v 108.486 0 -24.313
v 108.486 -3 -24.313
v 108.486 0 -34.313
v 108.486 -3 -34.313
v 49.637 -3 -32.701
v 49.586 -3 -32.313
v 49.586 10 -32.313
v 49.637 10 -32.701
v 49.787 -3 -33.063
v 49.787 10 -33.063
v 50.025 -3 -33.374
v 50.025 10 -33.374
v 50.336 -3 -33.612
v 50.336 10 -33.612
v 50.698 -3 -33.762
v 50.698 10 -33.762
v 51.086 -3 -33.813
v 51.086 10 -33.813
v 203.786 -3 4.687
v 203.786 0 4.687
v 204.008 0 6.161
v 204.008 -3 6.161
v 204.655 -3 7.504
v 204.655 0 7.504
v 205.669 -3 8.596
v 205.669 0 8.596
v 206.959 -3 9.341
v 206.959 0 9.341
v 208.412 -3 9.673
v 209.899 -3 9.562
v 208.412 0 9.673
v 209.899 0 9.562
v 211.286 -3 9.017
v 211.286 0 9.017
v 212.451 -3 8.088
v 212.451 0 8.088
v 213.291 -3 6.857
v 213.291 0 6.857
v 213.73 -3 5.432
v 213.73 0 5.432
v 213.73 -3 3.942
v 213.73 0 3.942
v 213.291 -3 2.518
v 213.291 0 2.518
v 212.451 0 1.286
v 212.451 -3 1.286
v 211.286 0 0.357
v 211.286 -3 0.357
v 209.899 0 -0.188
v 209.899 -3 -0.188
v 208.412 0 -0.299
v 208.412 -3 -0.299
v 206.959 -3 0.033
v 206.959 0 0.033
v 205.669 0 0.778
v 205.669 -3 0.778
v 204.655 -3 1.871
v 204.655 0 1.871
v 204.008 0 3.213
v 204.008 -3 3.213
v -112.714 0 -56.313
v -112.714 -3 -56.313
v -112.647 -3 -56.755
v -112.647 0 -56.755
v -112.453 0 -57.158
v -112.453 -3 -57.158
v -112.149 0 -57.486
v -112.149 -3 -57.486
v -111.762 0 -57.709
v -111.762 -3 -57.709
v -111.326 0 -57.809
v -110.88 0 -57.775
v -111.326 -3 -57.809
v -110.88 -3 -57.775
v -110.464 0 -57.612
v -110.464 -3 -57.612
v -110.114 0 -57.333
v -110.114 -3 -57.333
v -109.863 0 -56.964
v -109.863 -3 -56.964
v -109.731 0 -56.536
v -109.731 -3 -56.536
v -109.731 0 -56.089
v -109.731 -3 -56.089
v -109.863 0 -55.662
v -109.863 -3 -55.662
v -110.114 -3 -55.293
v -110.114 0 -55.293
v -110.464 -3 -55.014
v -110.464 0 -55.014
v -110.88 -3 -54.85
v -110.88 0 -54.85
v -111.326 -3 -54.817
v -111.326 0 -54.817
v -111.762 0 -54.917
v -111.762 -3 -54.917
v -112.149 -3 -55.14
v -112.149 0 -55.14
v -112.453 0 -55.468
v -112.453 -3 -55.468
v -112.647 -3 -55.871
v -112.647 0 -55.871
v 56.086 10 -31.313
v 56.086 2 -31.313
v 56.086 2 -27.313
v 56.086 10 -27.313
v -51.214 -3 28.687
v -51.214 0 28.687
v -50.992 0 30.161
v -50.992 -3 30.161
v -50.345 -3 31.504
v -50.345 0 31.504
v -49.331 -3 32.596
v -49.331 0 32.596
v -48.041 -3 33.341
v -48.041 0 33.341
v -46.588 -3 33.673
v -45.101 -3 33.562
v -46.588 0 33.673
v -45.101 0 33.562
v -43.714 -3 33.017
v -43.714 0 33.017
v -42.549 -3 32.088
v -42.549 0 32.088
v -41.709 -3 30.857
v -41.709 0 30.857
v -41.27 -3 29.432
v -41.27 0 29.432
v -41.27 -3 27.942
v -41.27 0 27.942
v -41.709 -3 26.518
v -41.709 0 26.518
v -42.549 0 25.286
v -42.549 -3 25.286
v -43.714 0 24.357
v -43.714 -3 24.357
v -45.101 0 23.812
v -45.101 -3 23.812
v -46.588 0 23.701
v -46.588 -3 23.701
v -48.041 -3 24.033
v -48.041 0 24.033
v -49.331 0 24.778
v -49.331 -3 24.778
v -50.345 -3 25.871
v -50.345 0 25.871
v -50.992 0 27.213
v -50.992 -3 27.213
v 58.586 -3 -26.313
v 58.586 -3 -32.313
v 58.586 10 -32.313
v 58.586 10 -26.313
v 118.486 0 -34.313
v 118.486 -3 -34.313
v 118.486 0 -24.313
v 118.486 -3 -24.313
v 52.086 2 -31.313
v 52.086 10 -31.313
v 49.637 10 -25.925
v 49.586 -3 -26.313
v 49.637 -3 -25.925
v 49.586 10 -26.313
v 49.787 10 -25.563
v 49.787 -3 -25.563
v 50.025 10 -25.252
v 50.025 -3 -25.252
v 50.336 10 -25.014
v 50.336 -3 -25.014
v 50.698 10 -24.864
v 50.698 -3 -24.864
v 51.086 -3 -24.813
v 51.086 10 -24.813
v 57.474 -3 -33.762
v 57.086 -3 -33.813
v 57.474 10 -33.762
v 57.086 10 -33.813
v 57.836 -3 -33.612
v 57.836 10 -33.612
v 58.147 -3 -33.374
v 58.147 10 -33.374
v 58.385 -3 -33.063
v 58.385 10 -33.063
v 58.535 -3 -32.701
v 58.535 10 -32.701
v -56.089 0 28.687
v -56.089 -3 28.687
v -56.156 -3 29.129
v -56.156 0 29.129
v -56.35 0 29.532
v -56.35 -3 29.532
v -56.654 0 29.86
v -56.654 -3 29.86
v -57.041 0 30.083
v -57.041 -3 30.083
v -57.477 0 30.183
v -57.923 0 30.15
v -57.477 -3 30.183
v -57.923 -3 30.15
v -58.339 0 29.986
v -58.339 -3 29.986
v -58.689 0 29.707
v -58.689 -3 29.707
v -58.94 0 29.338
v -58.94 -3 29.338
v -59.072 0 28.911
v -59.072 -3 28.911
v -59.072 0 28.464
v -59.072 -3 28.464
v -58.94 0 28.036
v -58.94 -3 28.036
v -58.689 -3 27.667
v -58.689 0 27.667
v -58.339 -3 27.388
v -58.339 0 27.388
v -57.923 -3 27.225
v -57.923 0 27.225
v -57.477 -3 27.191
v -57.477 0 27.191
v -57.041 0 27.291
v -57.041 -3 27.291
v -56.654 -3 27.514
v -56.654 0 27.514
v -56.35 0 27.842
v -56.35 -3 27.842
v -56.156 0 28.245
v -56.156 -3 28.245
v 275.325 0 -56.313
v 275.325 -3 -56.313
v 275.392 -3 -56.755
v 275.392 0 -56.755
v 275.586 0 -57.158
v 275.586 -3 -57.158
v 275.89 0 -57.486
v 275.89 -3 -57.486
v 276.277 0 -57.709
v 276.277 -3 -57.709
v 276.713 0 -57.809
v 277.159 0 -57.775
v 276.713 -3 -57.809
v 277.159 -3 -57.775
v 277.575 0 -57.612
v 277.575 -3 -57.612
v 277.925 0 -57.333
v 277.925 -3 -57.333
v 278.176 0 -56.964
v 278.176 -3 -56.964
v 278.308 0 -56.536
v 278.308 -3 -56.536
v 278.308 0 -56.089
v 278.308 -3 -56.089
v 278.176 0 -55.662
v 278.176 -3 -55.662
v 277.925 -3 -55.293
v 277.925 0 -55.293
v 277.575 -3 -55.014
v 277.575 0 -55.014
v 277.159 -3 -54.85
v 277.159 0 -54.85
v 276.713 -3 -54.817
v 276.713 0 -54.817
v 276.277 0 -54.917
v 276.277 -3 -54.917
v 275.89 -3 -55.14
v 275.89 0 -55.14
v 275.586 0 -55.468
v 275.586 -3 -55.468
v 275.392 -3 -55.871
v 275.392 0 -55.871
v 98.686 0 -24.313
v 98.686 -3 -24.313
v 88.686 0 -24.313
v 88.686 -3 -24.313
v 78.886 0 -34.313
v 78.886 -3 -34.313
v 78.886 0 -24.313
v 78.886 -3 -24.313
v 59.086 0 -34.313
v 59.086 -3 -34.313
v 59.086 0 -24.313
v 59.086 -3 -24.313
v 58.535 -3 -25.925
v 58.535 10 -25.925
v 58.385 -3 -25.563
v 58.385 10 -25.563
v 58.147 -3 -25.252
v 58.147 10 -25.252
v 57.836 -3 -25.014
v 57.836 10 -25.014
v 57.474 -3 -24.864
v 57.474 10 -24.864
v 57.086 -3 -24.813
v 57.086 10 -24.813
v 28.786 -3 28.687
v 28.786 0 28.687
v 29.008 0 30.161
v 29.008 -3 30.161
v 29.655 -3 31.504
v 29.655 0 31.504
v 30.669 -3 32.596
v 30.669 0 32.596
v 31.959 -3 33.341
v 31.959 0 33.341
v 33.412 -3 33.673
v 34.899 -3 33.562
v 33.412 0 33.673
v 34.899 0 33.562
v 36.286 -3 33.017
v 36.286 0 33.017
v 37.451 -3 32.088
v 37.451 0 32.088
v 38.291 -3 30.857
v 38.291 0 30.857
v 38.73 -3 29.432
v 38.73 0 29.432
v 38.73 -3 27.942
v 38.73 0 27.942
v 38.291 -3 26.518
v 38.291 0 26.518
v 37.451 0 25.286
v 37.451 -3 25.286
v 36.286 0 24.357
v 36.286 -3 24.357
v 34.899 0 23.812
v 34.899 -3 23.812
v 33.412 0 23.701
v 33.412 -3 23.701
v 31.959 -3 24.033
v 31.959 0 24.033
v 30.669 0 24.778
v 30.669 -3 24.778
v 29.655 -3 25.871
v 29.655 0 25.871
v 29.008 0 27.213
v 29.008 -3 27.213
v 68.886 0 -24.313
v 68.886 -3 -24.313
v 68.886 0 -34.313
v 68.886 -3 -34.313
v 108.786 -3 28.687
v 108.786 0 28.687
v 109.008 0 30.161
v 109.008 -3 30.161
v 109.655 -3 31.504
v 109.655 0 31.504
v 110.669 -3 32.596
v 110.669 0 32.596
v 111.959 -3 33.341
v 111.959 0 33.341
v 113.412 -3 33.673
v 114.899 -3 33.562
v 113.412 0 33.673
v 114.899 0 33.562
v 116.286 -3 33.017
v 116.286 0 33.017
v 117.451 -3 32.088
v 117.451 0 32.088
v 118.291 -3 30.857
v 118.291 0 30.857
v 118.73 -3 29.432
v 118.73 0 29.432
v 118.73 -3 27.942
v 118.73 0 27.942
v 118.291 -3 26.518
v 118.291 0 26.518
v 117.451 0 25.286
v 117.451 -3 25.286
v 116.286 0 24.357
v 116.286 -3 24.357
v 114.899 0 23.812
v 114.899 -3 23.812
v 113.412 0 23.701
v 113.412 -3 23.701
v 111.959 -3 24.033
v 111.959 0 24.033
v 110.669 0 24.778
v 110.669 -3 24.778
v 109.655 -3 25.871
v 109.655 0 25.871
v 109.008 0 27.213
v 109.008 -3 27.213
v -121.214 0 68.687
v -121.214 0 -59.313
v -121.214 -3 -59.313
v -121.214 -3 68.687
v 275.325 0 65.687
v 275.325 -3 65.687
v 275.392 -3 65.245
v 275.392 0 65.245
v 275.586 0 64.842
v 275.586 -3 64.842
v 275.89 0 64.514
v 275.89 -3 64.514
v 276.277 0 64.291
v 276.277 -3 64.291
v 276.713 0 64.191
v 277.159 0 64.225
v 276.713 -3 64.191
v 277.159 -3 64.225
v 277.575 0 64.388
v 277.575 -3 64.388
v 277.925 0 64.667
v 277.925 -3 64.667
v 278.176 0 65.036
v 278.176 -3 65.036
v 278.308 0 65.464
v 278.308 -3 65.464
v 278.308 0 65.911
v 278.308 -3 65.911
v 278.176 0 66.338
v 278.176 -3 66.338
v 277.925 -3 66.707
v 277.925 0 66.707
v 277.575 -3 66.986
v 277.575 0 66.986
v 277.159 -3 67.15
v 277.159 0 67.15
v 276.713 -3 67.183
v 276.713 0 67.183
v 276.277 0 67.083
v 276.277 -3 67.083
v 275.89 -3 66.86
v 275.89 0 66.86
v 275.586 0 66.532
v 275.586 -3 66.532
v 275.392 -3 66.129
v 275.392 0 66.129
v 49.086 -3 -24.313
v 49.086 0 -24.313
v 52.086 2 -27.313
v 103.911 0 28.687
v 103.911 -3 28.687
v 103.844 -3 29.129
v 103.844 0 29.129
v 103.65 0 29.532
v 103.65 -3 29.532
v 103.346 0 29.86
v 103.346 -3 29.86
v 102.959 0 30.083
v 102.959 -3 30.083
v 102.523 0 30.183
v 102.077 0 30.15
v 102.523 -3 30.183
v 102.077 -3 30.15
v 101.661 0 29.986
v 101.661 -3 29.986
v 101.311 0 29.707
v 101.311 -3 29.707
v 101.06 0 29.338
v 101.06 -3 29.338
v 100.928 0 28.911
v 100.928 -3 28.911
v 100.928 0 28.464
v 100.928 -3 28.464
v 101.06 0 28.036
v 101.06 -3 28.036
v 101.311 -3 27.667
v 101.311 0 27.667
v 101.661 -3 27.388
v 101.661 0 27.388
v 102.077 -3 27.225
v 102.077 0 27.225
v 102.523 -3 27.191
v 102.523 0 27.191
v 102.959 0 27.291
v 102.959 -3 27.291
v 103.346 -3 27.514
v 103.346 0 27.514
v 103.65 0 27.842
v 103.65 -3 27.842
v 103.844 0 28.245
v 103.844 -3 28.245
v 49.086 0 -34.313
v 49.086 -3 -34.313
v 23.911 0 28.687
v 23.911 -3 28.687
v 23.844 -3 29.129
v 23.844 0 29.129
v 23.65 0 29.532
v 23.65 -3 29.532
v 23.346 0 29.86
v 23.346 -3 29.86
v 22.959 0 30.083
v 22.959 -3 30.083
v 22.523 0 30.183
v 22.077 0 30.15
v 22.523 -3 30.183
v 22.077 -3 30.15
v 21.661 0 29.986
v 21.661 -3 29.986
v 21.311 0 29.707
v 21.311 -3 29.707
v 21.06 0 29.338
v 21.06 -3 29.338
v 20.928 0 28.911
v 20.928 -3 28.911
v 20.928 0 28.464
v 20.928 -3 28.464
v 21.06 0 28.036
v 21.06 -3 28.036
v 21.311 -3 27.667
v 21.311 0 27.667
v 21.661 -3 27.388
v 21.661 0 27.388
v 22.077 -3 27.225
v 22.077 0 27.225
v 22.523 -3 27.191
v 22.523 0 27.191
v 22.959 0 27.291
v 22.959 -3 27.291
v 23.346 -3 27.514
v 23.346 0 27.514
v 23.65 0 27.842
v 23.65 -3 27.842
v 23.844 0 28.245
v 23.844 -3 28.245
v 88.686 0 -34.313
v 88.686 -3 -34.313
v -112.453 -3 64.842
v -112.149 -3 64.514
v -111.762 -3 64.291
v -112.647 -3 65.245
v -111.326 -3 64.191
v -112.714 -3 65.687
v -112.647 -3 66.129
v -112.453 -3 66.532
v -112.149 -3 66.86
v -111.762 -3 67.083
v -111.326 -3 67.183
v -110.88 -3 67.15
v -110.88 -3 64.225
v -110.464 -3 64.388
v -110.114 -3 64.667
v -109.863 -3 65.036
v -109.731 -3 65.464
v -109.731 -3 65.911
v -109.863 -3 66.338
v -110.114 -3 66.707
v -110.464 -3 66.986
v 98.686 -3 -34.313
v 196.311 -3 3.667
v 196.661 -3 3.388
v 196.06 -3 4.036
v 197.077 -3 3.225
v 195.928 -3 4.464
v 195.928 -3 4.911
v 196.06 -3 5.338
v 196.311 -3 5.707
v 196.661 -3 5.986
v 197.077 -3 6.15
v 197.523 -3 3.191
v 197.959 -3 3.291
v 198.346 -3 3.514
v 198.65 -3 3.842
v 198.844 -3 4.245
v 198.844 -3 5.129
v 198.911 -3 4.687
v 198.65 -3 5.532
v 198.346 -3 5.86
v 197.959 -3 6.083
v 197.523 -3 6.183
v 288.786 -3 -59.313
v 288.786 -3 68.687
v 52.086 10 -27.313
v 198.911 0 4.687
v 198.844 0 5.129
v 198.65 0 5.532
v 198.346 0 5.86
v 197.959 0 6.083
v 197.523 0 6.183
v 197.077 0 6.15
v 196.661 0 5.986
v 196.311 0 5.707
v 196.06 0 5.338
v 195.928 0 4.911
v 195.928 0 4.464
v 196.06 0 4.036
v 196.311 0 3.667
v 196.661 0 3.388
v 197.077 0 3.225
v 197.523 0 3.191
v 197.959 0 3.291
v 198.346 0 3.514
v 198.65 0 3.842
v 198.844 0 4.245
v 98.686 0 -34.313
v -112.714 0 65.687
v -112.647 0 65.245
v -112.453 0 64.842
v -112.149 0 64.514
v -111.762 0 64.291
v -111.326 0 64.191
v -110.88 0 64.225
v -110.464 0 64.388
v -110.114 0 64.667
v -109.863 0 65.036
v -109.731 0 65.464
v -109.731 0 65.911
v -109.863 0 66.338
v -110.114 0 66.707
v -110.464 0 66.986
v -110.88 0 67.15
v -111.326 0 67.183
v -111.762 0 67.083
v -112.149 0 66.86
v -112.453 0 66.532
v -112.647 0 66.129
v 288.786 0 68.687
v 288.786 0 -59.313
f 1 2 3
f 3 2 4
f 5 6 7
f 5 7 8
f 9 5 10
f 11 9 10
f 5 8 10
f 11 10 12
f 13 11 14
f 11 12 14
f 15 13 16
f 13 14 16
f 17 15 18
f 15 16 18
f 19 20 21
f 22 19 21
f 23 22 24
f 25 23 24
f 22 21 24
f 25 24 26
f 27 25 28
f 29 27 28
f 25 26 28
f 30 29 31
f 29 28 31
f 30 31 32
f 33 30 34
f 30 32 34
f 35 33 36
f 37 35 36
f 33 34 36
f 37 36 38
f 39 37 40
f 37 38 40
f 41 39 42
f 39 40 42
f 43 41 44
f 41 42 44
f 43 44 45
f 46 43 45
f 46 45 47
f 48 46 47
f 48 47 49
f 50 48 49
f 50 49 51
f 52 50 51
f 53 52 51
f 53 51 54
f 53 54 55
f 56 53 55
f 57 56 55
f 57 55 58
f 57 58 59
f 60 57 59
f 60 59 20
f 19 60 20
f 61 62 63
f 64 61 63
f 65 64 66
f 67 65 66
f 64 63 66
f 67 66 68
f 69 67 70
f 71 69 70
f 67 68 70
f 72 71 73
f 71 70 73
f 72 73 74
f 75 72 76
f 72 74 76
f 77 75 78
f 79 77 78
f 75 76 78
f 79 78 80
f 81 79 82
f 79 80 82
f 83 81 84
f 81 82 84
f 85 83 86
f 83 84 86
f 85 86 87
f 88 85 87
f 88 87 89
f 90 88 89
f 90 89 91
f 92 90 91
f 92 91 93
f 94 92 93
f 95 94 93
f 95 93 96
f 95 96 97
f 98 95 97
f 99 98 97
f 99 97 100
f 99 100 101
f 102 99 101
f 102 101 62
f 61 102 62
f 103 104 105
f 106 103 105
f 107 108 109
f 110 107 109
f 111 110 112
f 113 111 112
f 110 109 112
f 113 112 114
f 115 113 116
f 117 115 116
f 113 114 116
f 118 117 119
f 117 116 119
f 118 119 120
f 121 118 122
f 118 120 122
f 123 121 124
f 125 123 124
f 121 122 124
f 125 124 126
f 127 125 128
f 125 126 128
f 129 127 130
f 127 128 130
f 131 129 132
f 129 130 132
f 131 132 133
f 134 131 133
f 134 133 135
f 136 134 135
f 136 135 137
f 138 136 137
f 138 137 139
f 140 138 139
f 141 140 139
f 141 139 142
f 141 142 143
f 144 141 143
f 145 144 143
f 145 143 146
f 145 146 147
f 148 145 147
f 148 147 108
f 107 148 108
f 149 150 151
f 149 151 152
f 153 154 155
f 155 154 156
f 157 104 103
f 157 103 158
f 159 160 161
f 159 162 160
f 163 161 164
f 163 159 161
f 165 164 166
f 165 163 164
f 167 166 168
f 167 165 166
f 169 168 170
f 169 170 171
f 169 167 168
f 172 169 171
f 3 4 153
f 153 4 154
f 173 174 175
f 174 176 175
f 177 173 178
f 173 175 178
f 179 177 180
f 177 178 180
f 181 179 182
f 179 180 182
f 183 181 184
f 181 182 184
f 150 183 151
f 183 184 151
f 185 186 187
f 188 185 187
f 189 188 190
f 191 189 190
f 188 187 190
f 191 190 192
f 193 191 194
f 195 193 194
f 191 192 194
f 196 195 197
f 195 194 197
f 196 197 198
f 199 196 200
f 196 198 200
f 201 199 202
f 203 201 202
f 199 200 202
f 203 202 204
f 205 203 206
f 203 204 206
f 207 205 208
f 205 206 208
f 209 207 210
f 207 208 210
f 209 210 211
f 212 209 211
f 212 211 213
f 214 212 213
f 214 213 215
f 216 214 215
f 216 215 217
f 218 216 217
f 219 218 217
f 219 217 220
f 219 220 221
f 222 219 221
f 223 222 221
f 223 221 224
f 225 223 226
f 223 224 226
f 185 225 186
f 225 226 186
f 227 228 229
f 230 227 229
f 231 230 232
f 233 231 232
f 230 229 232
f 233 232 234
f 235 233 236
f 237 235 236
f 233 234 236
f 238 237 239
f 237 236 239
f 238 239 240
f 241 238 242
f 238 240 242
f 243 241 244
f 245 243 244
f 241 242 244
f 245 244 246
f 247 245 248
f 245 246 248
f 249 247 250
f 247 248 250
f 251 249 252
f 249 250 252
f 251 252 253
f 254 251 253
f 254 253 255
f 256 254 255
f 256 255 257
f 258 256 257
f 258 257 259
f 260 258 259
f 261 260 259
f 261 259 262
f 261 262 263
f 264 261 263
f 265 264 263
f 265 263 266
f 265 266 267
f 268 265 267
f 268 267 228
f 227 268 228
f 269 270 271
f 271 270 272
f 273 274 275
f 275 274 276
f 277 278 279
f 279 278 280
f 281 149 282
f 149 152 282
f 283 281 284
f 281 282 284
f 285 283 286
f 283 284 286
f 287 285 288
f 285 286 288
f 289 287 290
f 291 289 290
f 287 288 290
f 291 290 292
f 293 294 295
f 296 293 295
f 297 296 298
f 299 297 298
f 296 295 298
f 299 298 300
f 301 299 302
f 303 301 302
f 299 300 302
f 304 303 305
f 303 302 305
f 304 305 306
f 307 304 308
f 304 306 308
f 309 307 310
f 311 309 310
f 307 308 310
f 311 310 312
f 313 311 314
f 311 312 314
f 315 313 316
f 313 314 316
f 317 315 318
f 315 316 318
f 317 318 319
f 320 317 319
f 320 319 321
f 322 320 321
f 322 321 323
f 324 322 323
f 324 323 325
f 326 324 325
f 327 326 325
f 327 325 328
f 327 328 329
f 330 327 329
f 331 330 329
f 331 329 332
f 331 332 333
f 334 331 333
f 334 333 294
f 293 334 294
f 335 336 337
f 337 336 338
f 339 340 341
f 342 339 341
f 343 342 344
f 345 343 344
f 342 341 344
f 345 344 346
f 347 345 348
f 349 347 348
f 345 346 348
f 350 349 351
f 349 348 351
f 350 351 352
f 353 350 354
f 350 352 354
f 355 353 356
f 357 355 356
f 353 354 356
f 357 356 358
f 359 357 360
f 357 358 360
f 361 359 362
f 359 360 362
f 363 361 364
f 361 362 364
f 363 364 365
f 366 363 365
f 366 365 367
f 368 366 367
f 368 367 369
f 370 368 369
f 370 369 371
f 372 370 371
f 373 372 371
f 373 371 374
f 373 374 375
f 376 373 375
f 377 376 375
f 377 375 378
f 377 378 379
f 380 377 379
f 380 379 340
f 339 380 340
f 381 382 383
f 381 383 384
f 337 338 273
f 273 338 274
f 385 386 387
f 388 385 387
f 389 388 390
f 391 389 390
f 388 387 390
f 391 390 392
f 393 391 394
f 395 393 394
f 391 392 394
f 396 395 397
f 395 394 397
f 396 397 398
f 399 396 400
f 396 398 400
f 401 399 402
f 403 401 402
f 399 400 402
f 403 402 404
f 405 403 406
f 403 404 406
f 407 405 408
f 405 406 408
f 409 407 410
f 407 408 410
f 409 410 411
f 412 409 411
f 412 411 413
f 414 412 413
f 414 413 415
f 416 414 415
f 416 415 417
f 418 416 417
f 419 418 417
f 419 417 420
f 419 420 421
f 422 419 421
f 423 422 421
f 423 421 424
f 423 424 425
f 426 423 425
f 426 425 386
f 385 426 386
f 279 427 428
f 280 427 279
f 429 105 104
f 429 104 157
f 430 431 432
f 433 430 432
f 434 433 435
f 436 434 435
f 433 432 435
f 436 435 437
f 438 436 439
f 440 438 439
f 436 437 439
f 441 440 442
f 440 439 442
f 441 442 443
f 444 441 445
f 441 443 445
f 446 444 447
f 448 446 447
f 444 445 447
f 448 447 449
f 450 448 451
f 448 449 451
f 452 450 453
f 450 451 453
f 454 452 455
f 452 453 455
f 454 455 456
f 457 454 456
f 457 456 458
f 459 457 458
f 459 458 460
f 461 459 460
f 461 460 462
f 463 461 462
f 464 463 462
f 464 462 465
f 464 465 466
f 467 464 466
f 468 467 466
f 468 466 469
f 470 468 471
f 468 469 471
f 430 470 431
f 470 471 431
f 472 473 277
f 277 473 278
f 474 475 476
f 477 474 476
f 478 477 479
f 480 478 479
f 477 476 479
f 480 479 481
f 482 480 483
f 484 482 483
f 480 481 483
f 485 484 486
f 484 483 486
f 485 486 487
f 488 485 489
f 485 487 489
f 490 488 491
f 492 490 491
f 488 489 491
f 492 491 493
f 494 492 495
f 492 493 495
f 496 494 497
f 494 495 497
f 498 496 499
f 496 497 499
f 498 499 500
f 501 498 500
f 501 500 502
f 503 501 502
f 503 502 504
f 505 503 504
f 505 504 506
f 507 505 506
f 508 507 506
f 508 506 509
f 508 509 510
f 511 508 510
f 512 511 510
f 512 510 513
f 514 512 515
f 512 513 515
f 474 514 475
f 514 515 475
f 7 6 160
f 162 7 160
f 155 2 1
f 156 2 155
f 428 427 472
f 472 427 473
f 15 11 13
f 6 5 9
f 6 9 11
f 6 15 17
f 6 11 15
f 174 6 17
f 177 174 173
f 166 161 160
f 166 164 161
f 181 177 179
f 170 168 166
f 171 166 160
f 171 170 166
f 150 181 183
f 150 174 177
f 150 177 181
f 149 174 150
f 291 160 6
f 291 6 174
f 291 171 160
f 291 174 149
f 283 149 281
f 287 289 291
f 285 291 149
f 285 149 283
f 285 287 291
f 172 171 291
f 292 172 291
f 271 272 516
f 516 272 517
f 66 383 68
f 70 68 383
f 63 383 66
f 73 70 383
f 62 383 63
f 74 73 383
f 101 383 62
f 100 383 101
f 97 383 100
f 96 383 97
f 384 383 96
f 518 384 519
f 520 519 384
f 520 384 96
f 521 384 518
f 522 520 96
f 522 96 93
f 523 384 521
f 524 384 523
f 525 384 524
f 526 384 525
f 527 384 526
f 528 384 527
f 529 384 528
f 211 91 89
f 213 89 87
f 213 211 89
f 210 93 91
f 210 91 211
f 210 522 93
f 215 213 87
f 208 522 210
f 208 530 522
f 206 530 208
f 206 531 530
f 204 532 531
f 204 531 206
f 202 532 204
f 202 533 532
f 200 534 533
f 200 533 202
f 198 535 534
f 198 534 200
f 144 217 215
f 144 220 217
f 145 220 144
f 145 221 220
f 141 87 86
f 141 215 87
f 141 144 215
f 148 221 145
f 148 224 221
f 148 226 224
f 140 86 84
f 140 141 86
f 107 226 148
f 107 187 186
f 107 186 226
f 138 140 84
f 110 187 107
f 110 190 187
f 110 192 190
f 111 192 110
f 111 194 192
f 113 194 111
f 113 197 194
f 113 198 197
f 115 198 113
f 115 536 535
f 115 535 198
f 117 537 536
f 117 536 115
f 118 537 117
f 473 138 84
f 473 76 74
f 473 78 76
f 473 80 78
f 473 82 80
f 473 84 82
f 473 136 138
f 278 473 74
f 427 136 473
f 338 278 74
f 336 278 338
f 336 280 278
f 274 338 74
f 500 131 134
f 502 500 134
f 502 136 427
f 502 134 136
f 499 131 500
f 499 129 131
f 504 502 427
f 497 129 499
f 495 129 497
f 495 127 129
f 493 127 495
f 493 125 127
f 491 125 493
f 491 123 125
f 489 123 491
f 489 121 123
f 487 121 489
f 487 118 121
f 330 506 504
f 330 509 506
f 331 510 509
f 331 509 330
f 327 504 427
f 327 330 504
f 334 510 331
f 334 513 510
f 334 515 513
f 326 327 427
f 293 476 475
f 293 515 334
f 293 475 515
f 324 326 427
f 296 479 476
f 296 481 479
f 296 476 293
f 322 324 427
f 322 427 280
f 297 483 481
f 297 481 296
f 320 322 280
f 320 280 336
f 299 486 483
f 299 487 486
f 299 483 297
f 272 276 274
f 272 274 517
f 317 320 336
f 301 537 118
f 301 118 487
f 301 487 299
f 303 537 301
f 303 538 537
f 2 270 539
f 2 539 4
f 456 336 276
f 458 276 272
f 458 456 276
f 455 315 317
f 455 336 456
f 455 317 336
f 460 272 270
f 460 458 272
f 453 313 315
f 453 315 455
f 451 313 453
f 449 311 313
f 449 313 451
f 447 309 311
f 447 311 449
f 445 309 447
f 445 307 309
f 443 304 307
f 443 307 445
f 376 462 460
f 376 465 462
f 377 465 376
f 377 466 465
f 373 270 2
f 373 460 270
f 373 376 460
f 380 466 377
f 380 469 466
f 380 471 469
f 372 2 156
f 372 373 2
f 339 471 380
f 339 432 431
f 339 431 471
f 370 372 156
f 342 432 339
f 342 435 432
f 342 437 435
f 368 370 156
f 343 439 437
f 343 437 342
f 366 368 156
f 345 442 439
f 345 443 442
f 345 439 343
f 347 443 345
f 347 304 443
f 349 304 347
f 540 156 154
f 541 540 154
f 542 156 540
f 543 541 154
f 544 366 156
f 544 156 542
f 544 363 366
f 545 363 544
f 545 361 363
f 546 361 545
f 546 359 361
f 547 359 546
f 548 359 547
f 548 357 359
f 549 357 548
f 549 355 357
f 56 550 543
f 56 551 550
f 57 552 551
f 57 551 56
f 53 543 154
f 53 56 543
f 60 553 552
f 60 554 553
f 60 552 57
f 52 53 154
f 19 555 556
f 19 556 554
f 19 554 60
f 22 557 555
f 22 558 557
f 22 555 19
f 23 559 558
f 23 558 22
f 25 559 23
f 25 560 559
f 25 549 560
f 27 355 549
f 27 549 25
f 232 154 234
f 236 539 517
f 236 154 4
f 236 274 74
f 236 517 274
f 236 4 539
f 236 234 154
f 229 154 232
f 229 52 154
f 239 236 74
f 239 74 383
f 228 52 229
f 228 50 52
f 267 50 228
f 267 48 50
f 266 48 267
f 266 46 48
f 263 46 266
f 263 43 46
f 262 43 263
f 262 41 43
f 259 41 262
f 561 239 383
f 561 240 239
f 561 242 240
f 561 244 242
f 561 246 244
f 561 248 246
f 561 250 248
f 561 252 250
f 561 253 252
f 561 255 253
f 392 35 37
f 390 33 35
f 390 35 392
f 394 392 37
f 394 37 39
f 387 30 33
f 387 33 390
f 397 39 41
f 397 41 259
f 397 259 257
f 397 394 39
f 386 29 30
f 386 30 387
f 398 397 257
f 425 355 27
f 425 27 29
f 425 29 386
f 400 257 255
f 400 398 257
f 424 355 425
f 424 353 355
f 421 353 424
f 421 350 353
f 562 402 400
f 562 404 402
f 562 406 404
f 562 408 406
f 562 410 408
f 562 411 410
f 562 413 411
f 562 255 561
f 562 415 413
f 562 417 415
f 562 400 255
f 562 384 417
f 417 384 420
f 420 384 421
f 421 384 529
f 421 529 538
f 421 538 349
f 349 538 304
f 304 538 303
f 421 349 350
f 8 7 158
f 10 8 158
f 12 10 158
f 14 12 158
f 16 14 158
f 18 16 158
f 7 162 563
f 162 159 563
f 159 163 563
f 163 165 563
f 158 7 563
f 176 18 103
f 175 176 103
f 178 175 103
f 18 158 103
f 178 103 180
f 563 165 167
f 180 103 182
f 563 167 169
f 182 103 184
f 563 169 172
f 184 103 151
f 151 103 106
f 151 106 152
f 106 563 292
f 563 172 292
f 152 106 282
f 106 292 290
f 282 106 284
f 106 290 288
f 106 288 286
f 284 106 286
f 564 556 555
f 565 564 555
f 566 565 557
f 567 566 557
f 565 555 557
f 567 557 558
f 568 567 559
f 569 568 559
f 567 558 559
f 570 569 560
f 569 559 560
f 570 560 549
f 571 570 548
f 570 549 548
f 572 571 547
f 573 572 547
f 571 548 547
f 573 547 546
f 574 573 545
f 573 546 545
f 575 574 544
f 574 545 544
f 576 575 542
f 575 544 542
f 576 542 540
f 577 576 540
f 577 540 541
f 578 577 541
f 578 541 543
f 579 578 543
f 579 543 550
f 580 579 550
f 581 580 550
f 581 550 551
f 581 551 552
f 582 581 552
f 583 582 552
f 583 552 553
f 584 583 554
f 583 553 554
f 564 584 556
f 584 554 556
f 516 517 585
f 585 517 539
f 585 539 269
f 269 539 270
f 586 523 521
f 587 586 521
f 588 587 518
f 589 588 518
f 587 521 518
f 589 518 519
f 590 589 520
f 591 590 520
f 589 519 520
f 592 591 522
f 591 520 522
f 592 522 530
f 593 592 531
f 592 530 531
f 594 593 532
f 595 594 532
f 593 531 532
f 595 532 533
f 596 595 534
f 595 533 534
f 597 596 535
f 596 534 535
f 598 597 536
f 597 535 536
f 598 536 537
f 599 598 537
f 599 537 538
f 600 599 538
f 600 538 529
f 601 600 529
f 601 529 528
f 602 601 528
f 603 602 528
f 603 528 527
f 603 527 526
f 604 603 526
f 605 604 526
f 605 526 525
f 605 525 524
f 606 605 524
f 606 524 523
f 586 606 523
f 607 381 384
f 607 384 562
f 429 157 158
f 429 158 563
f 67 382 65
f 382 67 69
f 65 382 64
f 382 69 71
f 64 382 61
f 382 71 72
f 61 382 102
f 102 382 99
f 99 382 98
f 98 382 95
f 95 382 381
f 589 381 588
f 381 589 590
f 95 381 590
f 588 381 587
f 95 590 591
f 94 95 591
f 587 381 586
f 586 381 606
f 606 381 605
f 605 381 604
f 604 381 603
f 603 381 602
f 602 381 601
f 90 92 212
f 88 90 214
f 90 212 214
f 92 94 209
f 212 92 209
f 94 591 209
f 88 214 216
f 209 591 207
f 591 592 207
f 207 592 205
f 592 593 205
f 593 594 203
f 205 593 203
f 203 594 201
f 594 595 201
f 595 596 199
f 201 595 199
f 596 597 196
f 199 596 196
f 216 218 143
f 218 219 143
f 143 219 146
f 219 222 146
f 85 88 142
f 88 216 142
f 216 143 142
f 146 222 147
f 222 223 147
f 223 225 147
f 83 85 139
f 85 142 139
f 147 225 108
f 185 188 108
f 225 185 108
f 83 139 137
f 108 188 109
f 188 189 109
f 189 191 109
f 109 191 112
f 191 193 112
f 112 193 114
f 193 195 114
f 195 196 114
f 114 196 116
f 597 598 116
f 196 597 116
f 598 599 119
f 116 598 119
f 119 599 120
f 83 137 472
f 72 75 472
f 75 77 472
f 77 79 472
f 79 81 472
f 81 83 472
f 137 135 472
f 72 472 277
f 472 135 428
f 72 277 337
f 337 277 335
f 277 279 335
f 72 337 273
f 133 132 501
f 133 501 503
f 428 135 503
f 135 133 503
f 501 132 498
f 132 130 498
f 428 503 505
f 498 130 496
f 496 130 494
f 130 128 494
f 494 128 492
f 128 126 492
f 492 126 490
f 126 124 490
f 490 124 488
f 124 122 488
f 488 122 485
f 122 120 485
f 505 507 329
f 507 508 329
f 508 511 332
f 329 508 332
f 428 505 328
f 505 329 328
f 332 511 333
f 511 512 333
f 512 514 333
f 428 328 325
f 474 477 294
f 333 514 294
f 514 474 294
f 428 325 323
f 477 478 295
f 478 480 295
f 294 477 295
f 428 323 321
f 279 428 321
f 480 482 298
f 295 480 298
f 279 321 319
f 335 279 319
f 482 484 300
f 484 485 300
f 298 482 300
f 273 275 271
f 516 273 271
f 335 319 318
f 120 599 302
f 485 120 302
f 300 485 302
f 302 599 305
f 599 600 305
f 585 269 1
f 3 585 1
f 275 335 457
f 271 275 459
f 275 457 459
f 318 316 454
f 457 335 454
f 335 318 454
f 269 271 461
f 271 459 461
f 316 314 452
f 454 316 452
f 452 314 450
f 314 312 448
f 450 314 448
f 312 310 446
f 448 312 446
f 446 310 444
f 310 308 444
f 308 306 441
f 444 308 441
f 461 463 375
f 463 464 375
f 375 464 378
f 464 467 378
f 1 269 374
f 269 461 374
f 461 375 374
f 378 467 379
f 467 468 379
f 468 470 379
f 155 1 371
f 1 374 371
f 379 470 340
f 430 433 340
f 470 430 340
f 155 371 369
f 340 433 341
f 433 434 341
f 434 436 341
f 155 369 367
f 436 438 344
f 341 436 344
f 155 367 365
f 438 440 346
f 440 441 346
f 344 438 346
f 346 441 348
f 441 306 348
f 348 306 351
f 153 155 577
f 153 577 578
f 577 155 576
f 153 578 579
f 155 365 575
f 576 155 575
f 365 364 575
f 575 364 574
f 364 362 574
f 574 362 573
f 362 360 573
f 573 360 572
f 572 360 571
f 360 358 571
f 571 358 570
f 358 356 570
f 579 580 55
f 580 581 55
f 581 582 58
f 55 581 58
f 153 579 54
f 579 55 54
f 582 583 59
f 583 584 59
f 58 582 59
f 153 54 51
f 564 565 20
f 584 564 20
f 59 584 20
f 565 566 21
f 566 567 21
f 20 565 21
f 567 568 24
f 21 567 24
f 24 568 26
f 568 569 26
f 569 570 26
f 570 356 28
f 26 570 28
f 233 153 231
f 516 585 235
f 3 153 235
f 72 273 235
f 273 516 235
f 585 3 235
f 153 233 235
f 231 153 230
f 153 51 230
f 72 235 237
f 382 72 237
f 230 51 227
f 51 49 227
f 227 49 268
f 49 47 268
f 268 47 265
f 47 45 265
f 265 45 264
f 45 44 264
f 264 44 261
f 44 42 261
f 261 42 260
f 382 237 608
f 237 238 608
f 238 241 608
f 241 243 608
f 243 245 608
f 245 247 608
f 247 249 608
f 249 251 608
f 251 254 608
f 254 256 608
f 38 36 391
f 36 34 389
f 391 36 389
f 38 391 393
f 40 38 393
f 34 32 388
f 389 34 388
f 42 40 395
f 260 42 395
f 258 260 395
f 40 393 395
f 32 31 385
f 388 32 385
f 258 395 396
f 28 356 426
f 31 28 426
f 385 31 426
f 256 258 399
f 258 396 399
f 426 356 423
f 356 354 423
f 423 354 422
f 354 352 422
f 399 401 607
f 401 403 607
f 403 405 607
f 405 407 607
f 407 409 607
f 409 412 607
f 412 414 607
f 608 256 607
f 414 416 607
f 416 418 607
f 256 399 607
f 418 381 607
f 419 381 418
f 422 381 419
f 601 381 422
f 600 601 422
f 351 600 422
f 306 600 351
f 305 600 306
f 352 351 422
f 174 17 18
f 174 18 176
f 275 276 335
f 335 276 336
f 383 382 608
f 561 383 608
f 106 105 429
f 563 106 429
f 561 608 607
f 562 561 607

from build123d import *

# Parameters (mm, degrees)
F0_W      = 410
F0_H      = 128
F1_DEPTH  = 3
F2_D      = 3
F4_D      = 10
F3_W      = 10
F3_H      = 5
F5_DEPTH  = 3
F3_R      = 1.5
F6_DEPTH  = 3
F7_W      = 9
F7_H      = 9
F8_DEPTH  = 13
F9_R      = 1.5
F10_W     = 4
F10_H     = 4
F11_DEPTH = 8


with BuildPart() as f1:
    # F0 (on Front) → F1 (new body)
    with BuildSketch(Plane.XZ):
        with Locations((83.7860082106, 4.6871258765)):
            Rectangle(F0_W, F0_H)
    extrude(amount=F1_DEPTH)

    # F2 (through all)
    with Locations(Plane(origin=(0, 0, 0), x_dir=(1, 0, 0), z_dir=(0, 1, 0))):
        with Locations((-111.2139917894, -65.6871258765), (276.8249472189, -65.6871258765), (276.8249472189, 56.3128741235), (-111.2139917894, 56.3128741235)):
            Hole(F2_D / 2)

    # F4 (through all)
    with Locations(Plane.XZ.offset(3)):
        with Locations((-46.2139917894, 28.6871258765), (33.7860082106, 28.6871258765), (113.7860082106, 28.6871258765), (208.7860082106, 4.6871258765)):
            Hole(F4_D / 2)

    # F3 (on face) → F5 (cut, through all)
    with BuildSketch(Plane.XZ.offset(3)):
        with Locations((54.0860082106, -31.8128741235)):
            Rectangle(F3_W, F3_H)
        with Locations((54.0860082106, -26.8128741235)):
            Rectangle(F3_W, F3_H)
        Polygon((73.8860082106, -29.3128741235), (78.8860082106, -29.3128741235), (78.8860082106, -24.3128741235), (68.8860082106, -24.3128741235), (68.8860082106, -29.3128741235), align=None)
        Polygon((78.8860082106, -34.3128741235), (78.8860082106, -29.3128741235), (73.8860082106, -29.3128741235), (68.8860082106, -29.3128741235), (68.8860082106, -34.3128741235), align=None)
        Polygon((93.6860082106, -29.3128741235), (88.6860082106, -29.3128741235), (88.6860082106, -34.3128741235), (98.6860082106, -34.3128741235), (98.6860082106, -29.3128741235), align=None)
        Polygon((88.6860082106, -24.3128741235), (88.6860082106, -29.3128741235), (93.6860082106, -29.3128741235), (98.6860082106, -29.3128741235), (98.6860082106, -24.3128741235), align=None)
        with Locations((113.4860082106, -26.8128741235)):
            Rectangle(F3_W, F3_H)
        with Locations((113.4860082106, -31.8128741235)):
            Rectangle(F3_W, F3_H)
    extrude(amount=-F5_DEPTH, mode=Mode.SUBTRACT)

    # F3 (on face) → F6 (cut, through all)
    with BuildSketch(Plane.XZ.offset(3)):
        with Locations((-57.5889917894, 28.6871258765)):
            Circle(F3_R)
        with Locations((22.4110082106, 28.6871258765)):
            Circle(F3_R)
        with Locations((102.4110082106, 28.6871258765)):
            Circle(F3_R)
        with Locations((197.4110082106, 4.6871258765)):
            Circle(F3_R)
    extrude(amount=-F6_DEPTH, mode=Mode.SUBTRACT)


with BuildPart() as f8:
    # F7 (on face) → F8 (new body)
    with BuildSketch(Plane.XZ.offset(3)):
        with Locations((54.0860082106, -29.3128741235)):
            Rectangle(F7_W, F7_H)
    extrude(amount=-F8_DEPTH)

    # F9
    f9_edges = [f8.edges().sort_by_distance(p)[0] for p in [
        (58.586008, 3.5, -24.812874),
        (49.586008, 3.5, -24.812874),
        (58.586008, 3.5, -33.812874),
        (49.586008, 3.5, -33.812874),
    ]]
    fillet(f9_edges, radius=F9_R)

    # F10 (on face) → F11 (cut)
    with BuildSketch(Plane(origin=(0, 10, 0), x_dir=(-1, 0, 0), z_dir=(0, 1, 0))):
        with Locations((-54.0860082106, -29.3128741235)):
            Rectangle(F10_W, F10_H)
    extrude(amount=-F11_DEPTH, mode=Mode.SUBTRACT)


solid = Compound([f1.part, f8.part])
